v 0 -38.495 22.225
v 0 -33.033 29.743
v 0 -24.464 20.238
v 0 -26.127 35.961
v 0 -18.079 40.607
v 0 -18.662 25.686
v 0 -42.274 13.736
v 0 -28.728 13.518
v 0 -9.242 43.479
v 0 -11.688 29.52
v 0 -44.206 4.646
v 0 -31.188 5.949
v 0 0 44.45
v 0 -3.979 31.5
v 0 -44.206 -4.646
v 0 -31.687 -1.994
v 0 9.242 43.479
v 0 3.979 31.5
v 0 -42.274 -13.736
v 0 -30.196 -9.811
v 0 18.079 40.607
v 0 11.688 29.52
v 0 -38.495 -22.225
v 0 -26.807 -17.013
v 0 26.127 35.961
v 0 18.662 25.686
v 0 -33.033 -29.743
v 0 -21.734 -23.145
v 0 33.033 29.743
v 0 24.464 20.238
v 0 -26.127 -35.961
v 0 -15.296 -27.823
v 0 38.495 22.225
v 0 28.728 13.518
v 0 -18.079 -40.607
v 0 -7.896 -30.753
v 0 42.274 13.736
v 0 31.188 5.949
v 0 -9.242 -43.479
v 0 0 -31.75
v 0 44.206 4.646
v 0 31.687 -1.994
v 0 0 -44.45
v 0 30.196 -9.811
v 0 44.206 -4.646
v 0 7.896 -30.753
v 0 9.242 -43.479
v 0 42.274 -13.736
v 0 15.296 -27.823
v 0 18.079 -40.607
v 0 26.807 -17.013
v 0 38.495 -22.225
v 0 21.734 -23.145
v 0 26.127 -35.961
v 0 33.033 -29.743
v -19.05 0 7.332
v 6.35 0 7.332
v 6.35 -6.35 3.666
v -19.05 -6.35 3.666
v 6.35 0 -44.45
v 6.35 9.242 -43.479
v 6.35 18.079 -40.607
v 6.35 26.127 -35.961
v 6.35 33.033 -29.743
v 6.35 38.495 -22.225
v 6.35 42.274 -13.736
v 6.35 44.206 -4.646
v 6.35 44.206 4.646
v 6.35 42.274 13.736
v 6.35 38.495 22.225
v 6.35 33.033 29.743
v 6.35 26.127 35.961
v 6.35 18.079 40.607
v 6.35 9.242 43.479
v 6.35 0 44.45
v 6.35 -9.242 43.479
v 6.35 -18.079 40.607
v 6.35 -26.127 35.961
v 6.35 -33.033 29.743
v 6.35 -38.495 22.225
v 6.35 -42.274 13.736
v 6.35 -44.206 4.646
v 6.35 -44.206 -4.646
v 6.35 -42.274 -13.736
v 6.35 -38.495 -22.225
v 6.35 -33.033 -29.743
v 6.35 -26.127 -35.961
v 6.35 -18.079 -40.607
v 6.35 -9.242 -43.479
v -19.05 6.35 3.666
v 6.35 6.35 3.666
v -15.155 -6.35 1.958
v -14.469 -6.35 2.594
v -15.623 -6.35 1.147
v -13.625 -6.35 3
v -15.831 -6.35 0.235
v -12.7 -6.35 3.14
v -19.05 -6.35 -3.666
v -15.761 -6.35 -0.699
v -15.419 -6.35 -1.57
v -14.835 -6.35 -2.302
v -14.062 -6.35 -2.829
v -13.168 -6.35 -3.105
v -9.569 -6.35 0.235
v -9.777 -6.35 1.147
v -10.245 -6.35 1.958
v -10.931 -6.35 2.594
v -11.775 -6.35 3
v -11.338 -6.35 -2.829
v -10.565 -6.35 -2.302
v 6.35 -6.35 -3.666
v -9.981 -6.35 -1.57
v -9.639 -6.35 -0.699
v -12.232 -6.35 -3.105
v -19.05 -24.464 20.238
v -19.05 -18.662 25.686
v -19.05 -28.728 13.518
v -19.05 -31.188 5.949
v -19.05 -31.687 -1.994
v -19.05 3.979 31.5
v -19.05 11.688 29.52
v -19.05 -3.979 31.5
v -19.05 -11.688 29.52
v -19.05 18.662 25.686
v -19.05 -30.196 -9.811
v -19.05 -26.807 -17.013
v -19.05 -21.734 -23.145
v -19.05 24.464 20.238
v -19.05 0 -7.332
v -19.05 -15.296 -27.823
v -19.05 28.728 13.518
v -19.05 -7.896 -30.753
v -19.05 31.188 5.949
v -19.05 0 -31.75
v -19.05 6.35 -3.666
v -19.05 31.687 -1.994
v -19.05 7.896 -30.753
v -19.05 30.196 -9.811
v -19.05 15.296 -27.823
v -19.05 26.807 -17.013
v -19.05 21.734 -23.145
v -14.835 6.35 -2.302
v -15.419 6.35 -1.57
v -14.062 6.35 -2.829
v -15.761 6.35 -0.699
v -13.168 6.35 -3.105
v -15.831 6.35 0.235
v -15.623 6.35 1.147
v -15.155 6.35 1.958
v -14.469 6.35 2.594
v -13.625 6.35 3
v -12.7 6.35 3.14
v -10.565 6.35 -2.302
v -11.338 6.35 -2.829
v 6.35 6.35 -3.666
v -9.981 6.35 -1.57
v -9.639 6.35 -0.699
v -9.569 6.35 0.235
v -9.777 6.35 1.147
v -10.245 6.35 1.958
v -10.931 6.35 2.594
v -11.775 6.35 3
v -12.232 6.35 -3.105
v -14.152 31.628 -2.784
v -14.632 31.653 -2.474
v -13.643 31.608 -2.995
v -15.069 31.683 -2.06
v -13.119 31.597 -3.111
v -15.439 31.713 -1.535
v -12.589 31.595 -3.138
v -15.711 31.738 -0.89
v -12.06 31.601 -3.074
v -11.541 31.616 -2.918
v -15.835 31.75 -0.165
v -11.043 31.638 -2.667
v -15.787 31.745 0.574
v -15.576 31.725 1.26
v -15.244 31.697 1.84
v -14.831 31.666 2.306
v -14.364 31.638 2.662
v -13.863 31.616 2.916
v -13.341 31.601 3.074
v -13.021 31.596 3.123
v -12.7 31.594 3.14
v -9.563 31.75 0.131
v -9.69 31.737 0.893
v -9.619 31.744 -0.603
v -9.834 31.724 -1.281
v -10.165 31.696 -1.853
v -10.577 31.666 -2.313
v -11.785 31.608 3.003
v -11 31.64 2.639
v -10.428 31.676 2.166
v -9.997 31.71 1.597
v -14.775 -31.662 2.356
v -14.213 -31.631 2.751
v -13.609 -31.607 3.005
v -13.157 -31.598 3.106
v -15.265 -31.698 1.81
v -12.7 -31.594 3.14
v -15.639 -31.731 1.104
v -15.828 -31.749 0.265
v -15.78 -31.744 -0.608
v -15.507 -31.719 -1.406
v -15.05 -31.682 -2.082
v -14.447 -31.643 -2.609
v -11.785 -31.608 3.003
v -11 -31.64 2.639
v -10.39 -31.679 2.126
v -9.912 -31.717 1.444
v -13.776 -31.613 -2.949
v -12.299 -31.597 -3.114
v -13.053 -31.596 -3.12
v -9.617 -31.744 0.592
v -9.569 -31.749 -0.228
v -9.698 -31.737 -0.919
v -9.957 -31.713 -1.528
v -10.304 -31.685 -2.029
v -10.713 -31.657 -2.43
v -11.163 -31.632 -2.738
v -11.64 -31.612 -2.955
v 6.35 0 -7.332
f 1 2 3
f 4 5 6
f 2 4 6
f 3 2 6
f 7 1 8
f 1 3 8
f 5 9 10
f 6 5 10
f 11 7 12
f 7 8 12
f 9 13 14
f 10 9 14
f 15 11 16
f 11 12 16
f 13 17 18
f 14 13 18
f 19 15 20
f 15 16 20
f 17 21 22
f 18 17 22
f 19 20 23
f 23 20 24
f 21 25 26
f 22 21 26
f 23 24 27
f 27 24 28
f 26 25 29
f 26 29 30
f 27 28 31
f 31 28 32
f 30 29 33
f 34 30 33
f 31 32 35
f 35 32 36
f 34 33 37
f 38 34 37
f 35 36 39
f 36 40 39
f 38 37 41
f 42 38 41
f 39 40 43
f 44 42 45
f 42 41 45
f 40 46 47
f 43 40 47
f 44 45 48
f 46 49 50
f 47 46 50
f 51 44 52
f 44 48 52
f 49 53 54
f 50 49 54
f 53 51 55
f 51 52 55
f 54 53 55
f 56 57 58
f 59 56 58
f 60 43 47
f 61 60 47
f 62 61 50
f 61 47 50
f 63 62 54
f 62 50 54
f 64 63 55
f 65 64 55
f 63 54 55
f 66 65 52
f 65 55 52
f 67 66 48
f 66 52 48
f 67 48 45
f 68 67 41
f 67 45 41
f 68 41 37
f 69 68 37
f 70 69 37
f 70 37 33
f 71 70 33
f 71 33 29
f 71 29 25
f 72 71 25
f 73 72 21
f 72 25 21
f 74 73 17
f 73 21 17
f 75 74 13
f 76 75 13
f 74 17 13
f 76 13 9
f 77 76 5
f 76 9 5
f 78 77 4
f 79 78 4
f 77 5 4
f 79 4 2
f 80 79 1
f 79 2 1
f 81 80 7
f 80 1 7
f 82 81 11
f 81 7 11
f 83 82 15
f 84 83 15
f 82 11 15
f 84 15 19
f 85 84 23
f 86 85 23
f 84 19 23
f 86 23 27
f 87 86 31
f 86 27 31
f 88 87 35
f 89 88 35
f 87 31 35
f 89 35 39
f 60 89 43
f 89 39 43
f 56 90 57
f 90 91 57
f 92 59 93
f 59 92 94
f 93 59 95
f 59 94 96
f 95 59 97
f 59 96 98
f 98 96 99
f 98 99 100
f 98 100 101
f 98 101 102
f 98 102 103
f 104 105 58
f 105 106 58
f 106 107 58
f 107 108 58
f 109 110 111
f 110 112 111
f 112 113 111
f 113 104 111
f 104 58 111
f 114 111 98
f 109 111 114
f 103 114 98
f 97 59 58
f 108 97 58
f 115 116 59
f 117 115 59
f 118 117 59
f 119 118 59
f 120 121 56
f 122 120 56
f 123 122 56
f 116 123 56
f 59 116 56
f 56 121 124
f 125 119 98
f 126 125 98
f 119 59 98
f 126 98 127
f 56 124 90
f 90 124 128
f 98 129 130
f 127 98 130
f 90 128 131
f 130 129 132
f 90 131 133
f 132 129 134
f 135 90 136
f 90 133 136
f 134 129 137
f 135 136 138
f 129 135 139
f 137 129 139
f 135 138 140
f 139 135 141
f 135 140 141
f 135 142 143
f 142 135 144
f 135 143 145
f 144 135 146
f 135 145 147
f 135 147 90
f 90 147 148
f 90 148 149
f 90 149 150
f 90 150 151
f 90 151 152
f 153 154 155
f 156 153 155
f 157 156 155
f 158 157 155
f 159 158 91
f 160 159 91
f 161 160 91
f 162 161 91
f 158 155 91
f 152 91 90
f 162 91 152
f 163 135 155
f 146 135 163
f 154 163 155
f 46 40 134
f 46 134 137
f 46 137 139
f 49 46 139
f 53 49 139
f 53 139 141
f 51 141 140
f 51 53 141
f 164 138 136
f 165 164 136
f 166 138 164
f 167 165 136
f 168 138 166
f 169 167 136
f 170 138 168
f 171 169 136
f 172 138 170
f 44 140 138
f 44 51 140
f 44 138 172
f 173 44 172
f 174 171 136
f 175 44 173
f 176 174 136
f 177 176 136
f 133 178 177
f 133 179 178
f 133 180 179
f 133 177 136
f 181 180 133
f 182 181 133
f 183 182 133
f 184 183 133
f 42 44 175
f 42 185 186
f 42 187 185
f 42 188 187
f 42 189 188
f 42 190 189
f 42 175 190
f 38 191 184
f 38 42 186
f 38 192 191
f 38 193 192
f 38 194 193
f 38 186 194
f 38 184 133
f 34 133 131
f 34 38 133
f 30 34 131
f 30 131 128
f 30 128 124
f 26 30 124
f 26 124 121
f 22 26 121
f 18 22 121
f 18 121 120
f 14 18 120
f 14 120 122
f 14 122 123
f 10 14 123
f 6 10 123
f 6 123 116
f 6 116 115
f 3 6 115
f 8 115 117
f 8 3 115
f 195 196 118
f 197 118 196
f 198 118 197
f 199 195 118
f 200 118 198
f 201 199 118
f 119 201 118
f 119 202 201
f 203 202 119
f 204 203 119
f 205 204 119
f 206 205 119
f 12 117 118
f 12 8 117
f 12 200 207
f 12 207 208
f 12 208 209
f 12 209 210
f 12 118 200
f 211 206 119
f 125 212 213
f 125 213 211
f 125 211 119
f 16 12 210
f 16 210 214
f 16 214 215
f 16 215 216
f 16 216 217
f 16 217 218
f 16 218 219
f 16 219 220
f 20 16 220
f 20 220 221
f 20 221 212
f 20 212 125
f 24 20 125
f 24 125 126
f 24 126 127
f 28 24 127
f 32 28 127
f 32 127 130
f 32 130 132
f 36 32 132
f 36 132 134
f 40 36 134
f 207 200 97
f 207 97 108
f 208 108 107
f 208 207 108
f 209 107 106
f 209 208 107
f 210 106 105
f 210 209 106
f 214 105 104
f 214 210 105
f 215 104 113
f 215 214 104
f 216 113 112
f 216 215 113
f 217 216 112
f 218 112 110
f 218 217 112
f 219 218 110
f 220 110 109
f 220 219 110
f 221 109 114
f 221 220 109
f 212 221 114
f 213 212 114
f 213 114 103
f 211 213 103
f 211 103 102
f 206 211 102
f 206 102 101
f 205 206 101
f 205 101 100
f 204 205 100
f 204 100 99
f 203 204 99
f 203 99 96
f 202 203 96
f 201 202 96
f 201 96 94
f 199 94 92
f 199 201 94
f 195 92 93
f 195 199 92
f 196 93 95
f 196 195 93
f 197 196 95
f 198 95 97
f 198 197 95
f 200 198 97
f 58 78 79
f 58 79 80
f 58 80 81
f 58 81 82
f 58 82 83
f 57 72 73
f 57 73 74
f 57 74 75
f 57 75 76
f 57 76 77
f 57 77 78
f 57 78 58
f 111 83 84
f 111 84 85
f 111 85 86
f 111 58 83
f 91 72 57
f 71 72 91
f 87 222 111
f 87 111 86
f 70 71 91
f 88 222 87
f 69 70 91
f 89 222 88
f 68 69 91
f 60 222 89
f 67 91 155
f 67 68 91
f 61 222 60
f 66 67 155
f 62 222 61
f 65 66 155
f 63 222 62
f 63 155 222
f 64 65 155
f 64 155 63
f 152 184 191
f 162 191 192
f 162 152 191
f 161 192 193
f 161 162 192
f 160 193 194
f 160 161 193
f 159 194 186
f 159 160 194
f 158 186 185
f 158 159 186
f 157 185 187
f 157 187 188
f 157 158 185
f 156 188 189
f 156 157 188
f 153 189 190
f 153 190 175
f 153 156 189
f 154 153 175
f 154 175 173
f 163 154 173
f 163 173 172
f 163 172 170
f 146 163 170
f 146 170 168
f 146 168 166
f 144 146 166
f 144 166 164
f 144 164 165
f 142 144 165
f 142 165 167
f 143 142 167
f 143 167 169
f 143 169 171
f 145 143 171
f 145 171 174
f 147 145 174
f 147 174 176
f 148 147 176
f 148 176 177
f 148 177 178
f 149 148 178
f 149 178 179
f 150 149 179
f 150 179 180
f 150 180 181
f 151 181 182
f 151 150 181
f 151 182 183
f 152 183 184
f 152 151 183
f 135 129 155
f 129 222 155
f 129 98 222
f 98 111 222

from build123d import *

# Parameters (mm, degrees)
SKETCH1_R               = 44.45
BOSS_EXTRUDE1_DEPTH     = 6.35
SKETCH2_R               = 31.75
BOSS_EXTRUDE2_DEPTH     = 19.05
CUT_EXTRUDE1_DEPTH      = 66.684910748
CUT_EXTRUDE1_DEPTH_BACK = 66.684910748
SKETCH3_R               = 3.139622981


with BuildPart() as part:
    # Sketch1 → Boss-Extrude1 (new body)
    with BuildSketch(Plane(origin=(0, 0, 0), x_dir=(0, 0, -1), z_dir=(1, 0, 0))):
        Circle(SKETCH1_R)
        Polygon((3.666174209, -6.35), (7.332348419, 0), (3.666174209, 6.35), (-3.666174209, 6.35), (-7.332348419, 0), (-3.666174209, -6.35), align=None, mode=Mode.SUBTRACT)
    extrude(amount=BOSS_EXTRUDE1_DEPTH)

    # Sketch2 → Boss-Extrude2 (add)
    with BuildSketch(Plane(origin=(0, 0, 0), x_dir=(0, 0, -1), z_dir=(1, 0, 0))):
        Circle(SKETCH2_R)
        Polygon((-7.332348419, 0), (-3.666174209, -6.35), (3.666174209, -6.35), (7.332348419, 0), (3.666174209, 6.35), (-3.666174209, 6.35), align=None, mode=Mode.SUBTRACT)
    extrude(amount=-BOSS_EXTRUDE2_DEPTH)

    # Sketch3 → Cut-Extrude1 (cut, two sides: drawn at the far end of the back side and taken through both)
    with BuildSketch(Plane(origin=(0, 0, 0), x_dir=(1, 0, 0), z_dir=(0, 1, 0)).offset(-CUT_EXTRUDE1_DEPTH_BACK)):
        with Locations(Location((-12.7, 0, 0), (0, 0, 270))):
            Circle(SKETCH3_R)
    extrude(amount=CUT_EXTRUDE1_DEPTH + CUT_EXTRUDE1_DEPTH_BACK, mode=Mode.SUBTRACT)


solid = part.part
